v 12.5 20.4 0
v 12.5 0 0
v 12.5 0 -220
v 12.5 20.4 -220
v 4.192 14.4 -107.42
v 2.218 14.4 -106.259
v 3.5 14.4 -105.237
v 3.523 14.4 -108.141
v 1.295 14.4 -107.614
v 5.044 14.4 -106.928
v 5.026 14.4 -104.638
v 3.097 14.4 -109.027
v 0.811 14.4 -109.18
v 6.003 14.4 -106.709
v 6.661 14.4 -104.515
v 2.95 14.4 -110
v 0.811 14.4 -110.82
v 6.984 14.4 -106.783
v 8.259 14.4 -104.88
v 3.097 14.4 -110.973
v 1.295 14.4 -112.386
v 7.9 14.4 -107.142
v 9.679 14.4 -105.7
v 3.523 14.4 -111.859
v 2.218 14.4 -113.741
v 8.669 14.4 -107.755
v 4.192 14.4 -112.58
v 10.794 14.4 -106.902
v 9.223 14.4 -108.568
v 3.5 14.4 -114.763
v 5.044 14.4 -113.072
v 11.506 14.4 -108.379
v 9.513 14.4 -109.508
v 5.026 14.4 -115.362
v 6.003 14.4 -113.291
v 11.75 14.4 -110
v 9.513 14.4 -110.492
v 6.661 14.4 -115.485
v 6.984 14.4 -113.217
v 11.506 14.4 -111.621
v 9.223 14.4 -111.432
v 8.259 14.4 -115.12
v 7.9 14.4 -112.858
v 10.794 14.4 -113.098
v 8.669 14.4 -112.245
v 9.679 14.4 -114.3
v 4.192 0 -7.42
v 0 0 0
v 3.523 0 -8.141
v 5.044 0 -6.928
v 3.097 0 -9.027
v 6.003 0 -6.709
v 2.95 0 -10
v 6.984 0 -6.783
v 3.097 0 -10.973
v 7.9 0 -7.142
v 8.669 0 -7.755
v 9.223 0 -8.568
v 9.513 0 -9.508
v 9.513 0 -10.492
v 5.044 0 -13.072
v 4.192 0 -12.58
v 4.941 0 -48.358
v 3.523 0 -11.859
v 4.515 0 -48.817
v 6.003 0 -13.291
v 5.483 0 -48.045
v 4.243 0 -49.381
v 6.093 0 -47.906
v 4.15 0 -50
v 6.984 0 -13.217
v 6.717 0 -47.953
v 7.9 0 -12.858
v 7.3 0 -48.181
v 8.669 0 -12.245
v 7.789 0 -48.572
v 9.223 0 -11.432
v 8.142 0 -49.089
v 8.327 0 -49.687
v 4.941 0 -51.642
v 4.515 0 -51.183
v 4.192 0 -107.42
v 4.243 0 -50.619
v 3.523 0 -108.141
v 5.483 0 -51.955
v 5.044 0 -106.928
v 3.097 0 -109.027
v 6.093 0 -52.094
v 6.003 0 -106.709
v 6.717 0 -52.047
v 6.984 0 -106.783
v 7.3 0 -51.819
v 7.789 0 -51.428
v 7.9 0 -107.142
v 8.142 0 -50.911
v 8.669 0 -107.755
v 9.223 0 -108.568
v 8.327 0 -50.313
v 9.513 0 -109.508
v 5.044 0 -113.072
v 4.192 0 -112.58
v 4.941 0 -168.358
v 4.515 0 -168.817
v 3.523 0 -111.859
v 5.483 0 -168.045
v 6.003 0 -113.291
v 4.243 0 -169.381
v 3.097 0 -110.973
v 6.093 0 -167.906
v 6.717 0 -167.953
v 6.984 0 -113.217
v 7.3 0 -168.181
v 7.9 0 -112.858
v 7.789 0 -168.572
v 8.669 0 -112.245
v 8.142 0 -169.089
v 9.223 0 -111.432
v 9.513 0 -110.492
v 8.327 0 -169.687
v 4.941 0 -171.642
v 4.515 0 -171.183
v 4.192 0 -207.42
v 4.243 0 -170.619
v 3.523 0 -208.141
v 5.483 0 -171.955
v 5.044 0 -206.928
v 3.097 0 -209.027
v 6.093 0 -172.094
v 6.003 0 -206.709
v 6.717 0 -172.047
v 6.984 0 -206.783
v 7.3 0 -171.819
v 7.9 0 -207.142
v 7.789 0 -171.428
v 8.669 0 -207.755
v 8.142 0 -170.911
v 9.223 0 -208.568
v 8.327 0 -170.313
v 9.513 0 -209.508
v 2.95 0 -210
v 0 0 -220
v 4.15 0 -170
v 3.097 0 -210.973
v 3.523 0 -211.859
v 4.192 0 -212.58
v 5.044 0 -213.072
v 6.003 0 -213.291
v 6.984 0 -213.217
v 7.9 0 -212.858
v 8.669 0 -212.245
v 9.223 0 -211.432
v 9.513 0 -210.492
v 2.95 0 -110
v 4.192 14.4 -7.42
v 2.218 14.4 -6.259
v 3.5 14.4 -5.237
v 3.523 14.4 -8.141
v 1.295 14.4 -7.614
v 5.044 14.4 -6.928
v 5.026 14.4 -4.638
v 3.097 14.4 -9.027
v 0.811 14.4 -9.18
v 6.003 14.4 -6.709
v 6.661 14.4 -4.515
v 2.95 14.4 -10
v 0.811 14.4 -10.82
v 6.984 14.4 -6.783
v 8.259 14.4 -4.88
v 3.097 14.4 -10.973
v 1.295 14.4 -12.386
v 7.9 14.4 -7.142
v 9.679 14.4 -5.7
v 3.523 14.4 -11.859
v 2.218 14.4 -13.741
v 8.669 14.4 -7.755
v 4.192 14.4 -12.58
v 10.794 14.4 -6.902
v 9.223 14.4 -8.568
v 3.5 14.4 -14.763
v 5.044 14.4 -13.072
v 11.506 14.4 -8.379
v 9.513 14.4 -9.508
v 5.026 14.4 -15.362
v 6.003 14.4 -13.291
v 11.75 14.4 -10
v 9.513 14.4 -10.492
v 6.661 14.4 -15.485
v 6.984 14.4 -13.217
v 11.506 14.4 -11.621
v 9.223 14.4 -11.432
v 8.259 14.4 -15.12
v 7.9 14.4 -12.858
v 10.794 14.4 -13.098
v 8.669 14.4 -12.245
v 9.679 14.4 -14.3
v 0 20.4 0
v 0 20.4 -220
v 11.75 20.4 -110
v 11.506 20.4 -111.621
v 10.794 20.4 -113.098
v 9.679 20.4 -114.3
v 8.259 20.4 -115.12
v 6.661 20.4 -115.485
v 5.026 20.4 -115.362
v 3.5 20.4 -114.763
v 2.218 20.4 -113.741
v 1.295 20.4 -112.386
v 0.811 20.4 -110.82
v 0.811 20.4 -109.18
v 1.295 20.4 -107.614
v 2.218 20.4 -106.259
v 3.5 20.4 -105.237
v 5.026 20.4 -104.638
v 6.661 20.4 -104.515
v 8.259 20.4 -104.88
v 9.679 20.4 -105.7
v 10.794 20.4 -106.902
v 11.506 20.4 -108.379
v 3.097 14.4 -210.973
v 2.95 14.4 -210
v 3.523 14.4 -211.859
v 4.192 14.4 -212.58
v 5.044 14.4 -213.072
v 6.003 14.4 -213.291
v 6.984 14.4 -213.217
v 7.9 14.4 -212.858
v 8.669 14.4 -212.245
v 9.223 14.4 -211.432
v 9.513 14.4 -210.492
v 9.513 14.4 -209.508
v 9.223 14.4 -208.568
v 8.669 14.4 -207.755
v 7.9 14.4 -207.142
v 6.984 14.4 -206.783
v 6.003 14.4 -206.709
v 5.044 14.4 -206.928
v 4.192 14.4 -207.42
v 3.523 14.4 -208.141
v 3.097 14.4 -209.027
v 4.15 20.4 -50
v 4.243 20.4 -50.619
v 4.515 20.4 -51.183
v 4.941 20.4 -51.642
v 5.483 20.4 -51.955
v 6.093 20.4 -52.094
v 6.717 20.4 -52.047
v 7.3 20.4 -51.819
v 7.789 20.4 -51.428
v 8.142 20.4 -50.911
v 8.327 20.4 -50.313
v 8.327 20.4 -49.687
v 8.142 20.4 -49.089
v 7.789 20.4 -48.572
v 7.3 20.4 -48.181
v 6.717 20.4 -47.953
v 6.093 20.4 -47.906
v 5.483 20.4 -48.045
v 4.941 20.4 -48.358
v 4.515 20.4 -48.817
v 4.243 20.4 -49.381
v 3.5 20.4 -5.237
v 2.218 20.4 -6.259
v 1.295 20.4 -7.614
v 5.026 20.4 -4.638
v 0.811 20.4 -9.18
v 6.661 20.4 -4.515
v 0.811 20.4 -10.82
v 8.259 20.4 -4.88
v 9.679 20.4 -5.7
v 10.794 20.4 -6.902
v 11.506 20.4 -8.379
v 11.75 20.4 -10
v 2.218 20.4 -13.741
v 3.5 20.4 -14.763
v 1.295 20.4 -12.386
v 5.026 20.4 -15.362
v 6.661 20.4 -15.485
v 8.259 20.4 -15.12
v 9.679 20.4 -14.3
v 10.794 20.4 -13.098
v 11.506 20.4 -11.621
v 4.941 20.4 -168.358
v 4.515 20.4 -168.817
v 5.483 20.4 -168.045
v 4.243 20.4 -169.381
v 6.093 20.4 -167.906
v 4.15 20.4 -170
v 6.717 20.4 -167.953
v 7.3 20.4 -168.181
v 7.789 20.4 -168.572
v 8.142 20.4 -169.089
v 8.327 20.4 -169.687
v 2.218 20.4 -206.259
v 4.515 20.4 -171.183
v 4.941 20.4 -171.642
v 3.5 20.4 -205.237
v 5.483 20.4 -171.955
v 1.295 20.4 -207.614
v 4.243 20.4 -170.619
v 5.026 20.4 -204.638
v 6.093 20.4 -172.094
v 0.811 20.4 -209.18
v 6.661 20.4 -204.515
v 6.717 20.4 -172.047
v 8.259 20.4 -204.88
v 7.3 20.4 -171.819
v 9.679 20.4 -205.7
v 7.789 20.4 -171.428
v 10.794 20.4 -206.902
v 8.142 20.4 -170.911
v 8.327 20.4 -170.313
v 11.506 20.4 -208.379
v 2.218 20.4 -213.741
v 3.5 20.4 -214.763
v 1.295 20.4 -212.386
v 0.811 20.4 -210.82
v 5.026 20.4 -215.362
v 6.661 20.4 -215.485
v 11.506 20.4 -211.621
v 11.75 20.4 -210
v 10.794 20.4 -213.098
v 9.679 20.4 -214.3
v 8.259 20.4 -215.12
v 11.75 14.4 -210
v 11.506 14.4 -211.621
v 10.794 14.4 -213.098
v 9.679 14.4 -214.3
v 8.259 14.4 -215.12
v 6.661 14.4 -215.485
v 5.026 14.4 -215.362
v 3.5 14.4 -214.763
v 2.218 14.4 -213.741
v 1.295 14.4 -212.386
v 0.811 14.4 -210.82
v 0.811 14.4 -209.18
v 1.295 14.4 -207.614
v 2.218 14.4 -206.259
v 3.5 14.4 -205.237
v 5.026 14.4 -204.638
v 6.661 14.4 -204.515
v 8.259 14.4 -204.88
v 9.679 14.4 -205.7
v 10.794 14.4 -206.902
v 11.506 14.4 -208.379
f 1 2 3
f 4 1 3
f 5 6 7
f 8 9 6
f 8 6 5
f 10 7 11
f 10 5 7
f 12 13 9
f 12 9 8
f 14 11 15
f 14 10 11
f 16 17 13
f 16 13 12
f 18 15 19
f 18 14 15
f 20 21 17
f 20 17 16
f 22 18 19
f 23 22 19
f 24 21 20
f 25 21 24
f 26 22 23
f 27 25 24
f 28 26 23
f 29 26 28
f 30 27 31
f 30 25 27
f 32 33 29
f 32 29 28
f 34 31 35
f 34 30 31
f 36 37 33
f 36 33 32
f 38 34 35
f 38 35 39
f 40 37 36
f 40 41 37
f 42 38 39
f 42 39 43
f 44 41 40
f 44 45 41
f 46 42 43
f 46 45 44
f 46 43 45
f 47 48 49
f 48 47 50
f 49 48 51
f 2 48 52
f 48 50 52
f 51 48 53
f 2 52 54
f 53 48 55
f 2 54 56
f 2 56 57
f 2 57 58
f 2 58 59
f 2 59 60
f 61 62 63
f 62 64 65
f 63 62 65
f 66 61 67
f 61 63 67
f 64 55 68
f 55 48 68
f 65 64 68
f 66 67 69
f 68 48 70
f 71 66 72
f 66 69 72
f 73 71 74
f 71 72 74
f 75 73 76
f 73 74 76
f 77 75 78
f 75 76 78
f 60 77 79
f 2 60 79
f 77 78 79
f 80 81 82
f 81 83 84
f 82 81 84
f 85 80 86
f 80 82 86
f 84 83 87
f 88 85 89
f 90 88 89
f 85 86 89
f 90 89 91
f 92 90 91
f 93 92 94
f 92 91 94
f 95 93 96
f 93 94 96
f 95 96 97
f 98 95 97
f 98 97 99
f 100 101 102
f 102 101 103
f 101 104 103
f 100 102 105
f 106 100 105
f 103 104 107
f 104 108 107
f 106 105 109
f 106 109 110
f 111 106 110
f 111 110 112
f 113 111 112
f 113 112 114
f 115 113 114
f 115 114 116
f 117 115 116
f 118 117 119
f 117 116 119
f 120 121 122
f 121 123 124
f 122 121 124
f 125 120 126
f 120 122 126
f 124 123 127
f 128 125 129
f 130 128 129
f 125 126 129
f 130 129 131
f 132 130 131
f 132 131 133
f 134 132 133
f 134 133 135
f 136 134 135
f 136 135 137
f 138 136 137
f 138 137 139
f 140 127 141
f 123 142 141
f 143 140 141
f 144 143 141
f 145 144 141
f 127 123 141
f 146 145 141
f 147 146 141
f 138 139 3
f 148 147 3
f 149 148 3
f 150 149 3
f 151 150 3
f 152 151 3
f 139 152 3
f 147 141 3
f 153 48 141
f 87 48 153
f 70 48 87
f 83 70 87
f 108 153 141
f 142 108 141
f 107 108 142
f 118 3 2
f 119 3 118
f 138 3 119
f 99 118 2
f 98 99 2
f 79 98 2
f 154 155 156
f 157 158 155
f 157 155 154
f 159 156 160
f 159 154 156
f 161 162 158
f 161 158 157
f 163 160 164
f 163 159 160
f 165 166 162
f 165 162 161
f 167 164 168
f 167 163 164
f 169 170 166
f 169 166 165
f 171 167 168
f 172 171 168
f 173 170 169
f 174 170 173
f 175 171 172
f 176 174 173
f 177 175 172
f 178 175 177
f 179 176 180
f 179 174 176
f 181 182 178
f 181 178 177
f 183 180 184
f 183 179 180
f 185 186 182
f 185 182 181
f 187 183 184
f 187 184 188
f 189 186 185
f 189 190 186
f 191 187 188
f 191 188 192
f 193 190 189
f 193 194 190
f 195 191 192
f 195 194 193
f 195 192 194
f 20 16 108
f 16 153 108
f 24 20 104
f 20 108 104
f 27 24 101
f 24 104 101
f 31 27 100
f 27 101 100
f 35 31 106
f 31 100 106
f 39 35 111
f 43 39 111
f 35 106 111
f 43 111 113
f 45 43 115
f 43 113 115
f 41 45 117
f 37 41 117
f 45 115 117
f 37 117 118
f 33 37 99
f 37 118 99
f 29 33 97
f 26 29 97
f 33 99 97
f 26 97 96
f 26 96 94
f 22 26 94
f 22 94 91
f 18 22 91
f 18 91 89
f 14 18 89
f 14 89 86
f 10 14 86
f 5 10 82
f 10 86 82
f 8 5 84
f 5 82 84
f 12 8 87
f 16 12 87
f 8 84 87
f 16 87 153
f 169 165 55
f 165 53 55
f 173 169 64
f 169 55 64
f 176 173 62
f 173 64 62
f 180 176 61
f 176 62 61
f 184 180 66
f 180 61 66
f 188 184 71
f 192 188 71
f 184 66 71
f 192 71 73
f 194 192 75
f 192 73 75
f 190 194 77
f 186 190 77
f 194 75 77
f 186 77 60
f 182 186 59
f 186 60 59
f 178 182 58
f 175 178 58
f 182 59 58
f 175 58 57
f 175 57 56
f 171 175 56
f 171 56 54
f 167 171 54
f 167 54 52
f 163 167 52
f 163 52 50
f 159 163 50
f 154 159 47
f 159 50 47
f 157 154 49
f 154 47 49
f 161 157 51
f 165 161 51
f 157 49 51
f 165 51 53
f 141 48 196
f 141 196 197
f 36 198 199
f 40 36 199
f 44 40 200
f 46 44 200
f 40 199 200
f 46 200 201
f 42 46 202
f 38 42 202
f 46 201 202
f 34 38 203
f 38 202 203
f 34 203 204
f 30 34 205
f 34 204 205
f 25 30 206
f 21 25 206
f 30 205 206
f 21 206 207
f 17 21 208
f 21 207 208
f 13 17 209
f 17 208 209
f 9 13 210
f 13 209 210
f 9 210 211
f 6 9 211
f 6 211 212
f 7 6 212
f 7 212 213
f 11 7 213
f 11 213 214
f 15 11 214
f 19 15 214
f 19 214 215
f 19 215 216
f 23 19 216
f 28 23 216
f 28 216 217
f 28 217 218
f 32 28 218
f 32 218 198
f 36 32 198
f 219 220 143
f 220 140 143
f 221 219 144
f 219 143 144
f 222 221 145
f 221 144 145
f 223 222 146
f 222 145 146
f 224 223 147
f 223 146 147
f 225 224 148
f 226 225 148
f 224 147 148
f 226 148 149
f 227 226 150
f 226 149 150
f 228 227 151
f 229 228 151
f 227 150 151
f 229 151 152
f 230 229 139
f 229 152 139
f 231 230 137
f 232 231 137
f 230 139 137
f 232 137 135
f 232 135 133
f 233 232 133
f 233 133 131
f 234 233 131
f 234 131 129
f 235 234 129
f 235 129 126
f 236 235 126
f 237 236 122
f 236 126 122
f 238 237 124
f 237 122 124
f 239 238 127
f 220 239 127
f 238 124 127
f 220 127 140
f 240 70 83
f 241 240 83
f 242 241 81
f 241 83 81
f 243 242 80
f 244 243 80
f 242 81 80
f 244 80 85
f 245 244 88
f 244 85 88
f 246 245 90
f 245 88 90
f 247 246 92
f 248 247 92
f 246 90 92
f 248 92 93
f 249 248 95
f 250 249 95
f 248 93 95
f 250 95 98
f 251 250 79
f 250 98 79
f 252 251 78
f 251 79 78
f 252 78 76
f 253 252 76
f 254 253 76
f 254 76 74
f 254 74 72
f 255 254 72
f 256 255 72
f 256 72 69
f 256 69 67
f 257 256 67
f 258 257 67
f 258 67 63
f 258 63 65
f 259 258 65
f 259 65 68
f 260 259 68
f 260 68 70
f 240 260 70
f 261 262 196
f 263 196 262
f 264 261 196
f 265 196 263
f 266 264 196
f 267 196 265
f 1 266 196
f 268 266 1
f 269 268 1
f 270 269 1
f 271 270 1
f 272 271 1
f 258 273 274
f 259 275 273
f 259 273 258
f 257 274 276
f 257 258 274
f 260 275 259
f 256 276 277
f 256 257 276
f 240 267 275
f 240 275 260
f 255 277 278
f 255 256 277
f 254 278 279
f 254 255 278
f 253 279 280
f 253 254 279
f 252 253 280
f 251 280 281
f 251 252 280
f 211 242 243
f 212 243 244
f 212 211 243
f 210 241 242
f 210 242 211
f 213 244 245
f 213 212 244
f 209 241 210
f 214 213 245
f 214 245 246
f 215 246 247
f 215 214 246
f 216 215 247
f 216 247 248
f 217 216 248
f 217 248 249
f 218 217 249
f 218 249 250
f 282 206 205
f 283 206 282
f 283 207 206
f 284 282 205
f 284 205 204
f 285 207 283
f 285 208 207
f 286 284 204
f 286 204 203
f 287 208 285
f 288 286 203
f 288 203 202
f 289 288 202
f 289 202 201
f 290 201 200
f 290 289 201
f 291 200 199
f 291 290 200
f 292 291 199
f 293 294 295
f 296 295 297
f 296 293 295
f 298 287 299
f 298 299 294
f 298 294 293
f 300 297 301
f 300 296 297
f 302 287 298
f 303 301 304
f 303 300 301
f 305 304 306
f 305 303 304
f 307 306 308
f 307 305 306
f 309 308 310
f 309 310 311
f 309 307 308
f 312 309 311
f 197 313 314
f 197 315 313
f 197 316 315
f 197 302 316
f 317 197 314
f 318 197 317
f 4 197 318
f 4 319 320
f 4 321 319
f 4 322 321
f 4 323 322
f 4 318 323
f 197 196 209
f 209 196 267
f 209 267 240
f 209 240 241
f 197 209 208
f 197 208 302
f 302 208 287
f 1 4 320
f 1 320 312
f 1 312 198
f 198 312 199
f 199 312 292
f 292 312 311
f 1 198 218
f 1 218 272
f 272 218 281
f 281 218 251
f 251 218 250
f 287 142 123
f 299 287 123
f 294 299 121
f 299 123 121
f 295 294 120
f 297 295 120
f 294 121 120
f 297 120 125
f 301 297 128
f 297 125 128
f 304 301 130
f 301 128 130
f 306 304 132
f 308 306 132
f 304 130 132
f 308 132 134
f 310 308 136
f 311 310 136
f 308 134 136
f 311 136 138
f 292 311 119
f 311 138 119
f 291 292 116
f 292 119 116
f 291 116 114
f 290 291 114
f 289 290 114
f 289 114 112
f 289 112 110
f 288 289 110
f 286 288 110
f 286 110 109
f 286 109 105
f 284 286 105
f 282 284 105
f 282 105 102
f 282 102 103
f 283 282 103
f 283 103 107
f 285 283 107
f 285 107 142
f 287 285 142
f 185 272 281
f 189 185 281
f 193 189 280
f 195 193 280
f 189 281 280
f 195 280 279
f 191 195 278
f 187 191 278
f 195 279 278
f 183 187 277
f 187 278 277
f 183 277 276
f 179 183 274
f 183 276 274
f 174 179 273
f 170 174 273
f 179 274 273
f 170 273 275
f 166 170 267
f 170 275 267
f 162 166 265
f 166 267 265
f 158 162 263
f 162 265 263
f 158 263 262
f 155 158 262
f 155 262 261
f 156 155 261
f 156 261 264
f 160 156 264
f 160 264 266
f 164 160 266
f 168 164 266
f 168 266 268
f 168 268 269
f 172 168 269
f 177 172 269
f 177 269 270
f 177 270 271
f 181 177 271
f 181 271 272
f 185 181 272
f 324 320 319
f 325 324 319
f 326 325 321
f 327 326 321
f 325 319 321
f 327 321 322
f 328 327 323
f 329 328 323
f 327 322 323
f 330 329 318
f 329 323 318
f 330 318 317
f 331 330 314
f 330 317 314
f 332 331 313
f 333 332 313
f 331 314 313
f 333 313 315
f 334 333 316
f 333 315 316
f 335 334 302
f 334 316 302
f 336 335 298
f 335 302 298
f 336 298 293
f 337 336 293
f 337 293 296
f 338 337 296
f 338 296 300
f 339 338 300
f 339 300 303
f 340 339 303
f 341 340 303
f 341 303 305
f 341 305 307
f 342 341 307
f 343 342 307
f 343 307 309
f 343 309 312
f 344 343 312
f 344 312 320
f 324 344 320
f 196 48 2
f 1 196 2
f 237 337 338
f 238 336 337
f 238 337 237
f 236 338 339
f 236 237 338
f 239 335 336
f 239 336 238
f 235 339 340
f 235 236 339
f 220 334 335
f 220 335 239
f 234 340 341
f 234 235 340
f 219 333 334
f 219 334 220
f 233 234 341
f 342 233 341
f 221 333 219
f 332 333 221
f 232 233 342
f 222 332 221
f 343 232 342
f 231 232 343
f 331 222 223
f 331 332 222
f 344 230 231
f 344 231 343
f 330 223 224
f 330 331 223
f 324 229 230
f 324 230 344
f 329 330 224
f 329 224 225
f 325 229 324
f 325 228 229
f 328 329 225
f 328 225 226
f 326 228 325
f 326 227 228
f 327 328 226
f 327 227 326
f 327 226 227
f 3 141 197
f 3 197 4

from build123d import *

# Parameters (mm, degrees)
SKETCH1_W                       = 12.5
SKETCH1_H                       = 220
BLOCO_DEPTH                     = 20.4
REBAIXO_M6_PASSANTE_D           = 6.6
REBAIXO_M6_PASSANTE_CBORE_D     = 11
REBAIXO_M6_PASSANTE_CBORE_DEPTH = 6
FURO_M5X0_8_PASSANTE_D          = 4.2


with BuildPart() as part:
    # Sketch1 → Bloco (new body)
    with BuildSketch(Plane(origin=(0, 0, 0), x_dir=(1, 0, 0), z_dir=(0, 1, 0))):
        with Locations((6.25, 110)):
            Rectangle(SKETCH1_W, SKETCH1_H)
    extrude(amount=BLOCO_DEPTH)

    # Rebaixo M6 - Passante (through all)
    with Locations(Plane(origin=(0, 20.4, 0), x_dir=(1, 0, 0), z_dir=(0, 1, 0))):
        with Locations((6.25, 10), (6.25, 110), (6.25, 210)):
            CounterBoreHole(REBAIXO_M6_PASSANTE_D / 2, REBAIXO_M6_PASSANTE_CBORE_D / 2, REBAIXO_M6_PASSANTE_CBORE_DEPTH)

    # Furo M5x0.8 - Passante (through all)
    with Locations(Plane(origin=(0, 20.4, 0), x_dir=(1, 0, 0), z_dir=(0, 1, 0))):
        with Locations((6.25, 50), (6.25, 170)):
            Hole(FURO_M5X0_8_PASSANTE_D / 2)


solid = part.part
